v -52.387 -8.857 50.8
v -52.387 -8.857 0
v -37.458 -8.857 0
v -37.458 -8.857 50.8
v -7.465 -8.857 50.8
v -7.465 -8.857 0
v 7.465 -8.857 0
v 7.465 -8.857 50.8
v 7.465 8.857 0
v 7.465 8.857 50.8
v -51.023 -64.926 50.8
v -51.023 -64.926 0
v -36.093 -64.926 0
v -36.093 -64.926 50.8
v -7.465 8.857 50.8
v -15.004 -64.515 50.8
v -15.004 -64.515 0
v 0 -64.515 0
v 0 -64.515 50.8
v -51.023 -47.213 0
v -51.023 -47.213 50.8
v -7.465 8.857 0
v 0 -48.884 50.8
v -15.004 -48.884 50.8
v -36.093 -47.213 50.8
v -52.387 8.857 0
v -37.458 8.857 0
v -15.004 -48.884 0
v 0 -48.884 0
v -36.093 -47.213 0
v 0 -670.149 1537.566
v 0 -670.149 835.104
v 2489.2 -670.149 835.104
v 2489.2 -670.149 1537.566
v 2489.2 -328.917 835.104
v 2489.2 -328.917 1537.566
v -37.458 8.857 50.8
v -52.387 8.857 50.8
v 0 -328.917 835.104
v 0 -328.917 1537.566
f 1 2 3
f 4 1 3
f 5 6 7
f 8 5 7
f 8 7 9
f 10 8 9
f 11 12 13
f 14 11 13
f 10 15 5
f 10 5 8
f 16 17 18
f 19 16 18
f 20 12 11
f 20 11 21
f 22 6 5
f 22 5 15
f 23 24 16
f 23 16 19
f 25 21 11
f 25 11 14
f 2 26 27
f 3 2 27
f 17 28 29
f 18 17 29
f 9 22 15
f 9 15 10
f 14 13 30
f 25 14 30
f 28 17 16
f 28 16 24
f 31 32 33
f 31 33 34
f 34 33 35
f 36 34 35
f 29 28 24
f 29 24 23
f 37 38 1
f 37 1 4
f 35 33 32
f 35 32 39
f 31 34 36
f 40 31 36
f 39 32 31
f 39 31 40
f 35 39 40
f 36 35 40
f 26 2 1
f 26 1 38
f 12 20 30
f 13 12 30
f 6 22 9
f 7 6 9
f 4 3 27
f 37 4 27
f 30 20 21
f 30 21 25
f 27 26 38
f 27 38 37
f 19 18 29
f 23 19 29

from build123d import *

# Parameters (mm, degrees)
F0_W      = 14.9299055338
F0_H      = 17.7132710814
F1_DEPTH  = 50.8
F2_W      = 14.9299055338
F2_H      = 17.7132710814
F3_DEPTH  = 50.8
F4_W      = 14.9299055338
F4_H      = 17.7132710814
F5_DEPTH  = 50.8
F6_W      = 15.0041207671
F6_H      = 15.6318694353
F7_DEPTH  = 50.8
F8_W      = 52.1195940673
F8_H      = 73.2580646873
F9_DEPTH  = 50.8
F10_W     = 341.2319123745
F10_H     = 702.4627327919
F11_DEPTH = 2489.2


with BuildPart() as f1:
    # F0 (on Top) → F1 (new body)
    with BuildSketch(Plane.XY):
        with Locations((-43.5579791665, -56.0692213476)):
            Rectangle(F0_W, F0_H)
    extrude(amount=F1_DEPTH)

    # F8 (on Top) → F9 (cut)
    with BuildSketch(Plane.XY):
        with Locations((-43.2957876474, -1.6988962889)):
            Rectangle(F8_W, F8_H)
    extrude(amount=-F9_DEPTH, mode=Mode.SUBTRACT)


with BuildPart() as f3:
    # F2 (on Top) → F3 (new body)
    with BuildSketch(Plane.XY):
        with Locations((-44.9225041084, 0)):
            Rectangle(F2_W, F2_H)
    extrude(amount=F3_DEPTH)


with BuildPart() as f5:
    # F4 (on Top) → F5 (new body)
    with BuildSketch(Plane.XY):
        Rectangle(F4_W, F4_H)
    extrude(amount=F5_DEPTH)


with BuildPart() as f7:
    # F6 (on Top) → F7 (new body)
    with BuildSketch(Plane.XY):
        with Locations((-7.5020603836, -56.6995218396)):
            Rectangle(F6_W, F6_H)
    extrude(amount=F7_DEPTH)


with BuildPart() as f11:
    # F10 (on Right) → F11 (new body)
    with BuildSketch(Plane.YZ):
        with Locations((-499.5325952768, 1186.3350570202)):
            Rectangle(F10_W, F10_H)
    extrude(amount=F11_DEPTH)


solid = Compound([f1.part, f3.part, f5.part, f7.part, f11.part])
